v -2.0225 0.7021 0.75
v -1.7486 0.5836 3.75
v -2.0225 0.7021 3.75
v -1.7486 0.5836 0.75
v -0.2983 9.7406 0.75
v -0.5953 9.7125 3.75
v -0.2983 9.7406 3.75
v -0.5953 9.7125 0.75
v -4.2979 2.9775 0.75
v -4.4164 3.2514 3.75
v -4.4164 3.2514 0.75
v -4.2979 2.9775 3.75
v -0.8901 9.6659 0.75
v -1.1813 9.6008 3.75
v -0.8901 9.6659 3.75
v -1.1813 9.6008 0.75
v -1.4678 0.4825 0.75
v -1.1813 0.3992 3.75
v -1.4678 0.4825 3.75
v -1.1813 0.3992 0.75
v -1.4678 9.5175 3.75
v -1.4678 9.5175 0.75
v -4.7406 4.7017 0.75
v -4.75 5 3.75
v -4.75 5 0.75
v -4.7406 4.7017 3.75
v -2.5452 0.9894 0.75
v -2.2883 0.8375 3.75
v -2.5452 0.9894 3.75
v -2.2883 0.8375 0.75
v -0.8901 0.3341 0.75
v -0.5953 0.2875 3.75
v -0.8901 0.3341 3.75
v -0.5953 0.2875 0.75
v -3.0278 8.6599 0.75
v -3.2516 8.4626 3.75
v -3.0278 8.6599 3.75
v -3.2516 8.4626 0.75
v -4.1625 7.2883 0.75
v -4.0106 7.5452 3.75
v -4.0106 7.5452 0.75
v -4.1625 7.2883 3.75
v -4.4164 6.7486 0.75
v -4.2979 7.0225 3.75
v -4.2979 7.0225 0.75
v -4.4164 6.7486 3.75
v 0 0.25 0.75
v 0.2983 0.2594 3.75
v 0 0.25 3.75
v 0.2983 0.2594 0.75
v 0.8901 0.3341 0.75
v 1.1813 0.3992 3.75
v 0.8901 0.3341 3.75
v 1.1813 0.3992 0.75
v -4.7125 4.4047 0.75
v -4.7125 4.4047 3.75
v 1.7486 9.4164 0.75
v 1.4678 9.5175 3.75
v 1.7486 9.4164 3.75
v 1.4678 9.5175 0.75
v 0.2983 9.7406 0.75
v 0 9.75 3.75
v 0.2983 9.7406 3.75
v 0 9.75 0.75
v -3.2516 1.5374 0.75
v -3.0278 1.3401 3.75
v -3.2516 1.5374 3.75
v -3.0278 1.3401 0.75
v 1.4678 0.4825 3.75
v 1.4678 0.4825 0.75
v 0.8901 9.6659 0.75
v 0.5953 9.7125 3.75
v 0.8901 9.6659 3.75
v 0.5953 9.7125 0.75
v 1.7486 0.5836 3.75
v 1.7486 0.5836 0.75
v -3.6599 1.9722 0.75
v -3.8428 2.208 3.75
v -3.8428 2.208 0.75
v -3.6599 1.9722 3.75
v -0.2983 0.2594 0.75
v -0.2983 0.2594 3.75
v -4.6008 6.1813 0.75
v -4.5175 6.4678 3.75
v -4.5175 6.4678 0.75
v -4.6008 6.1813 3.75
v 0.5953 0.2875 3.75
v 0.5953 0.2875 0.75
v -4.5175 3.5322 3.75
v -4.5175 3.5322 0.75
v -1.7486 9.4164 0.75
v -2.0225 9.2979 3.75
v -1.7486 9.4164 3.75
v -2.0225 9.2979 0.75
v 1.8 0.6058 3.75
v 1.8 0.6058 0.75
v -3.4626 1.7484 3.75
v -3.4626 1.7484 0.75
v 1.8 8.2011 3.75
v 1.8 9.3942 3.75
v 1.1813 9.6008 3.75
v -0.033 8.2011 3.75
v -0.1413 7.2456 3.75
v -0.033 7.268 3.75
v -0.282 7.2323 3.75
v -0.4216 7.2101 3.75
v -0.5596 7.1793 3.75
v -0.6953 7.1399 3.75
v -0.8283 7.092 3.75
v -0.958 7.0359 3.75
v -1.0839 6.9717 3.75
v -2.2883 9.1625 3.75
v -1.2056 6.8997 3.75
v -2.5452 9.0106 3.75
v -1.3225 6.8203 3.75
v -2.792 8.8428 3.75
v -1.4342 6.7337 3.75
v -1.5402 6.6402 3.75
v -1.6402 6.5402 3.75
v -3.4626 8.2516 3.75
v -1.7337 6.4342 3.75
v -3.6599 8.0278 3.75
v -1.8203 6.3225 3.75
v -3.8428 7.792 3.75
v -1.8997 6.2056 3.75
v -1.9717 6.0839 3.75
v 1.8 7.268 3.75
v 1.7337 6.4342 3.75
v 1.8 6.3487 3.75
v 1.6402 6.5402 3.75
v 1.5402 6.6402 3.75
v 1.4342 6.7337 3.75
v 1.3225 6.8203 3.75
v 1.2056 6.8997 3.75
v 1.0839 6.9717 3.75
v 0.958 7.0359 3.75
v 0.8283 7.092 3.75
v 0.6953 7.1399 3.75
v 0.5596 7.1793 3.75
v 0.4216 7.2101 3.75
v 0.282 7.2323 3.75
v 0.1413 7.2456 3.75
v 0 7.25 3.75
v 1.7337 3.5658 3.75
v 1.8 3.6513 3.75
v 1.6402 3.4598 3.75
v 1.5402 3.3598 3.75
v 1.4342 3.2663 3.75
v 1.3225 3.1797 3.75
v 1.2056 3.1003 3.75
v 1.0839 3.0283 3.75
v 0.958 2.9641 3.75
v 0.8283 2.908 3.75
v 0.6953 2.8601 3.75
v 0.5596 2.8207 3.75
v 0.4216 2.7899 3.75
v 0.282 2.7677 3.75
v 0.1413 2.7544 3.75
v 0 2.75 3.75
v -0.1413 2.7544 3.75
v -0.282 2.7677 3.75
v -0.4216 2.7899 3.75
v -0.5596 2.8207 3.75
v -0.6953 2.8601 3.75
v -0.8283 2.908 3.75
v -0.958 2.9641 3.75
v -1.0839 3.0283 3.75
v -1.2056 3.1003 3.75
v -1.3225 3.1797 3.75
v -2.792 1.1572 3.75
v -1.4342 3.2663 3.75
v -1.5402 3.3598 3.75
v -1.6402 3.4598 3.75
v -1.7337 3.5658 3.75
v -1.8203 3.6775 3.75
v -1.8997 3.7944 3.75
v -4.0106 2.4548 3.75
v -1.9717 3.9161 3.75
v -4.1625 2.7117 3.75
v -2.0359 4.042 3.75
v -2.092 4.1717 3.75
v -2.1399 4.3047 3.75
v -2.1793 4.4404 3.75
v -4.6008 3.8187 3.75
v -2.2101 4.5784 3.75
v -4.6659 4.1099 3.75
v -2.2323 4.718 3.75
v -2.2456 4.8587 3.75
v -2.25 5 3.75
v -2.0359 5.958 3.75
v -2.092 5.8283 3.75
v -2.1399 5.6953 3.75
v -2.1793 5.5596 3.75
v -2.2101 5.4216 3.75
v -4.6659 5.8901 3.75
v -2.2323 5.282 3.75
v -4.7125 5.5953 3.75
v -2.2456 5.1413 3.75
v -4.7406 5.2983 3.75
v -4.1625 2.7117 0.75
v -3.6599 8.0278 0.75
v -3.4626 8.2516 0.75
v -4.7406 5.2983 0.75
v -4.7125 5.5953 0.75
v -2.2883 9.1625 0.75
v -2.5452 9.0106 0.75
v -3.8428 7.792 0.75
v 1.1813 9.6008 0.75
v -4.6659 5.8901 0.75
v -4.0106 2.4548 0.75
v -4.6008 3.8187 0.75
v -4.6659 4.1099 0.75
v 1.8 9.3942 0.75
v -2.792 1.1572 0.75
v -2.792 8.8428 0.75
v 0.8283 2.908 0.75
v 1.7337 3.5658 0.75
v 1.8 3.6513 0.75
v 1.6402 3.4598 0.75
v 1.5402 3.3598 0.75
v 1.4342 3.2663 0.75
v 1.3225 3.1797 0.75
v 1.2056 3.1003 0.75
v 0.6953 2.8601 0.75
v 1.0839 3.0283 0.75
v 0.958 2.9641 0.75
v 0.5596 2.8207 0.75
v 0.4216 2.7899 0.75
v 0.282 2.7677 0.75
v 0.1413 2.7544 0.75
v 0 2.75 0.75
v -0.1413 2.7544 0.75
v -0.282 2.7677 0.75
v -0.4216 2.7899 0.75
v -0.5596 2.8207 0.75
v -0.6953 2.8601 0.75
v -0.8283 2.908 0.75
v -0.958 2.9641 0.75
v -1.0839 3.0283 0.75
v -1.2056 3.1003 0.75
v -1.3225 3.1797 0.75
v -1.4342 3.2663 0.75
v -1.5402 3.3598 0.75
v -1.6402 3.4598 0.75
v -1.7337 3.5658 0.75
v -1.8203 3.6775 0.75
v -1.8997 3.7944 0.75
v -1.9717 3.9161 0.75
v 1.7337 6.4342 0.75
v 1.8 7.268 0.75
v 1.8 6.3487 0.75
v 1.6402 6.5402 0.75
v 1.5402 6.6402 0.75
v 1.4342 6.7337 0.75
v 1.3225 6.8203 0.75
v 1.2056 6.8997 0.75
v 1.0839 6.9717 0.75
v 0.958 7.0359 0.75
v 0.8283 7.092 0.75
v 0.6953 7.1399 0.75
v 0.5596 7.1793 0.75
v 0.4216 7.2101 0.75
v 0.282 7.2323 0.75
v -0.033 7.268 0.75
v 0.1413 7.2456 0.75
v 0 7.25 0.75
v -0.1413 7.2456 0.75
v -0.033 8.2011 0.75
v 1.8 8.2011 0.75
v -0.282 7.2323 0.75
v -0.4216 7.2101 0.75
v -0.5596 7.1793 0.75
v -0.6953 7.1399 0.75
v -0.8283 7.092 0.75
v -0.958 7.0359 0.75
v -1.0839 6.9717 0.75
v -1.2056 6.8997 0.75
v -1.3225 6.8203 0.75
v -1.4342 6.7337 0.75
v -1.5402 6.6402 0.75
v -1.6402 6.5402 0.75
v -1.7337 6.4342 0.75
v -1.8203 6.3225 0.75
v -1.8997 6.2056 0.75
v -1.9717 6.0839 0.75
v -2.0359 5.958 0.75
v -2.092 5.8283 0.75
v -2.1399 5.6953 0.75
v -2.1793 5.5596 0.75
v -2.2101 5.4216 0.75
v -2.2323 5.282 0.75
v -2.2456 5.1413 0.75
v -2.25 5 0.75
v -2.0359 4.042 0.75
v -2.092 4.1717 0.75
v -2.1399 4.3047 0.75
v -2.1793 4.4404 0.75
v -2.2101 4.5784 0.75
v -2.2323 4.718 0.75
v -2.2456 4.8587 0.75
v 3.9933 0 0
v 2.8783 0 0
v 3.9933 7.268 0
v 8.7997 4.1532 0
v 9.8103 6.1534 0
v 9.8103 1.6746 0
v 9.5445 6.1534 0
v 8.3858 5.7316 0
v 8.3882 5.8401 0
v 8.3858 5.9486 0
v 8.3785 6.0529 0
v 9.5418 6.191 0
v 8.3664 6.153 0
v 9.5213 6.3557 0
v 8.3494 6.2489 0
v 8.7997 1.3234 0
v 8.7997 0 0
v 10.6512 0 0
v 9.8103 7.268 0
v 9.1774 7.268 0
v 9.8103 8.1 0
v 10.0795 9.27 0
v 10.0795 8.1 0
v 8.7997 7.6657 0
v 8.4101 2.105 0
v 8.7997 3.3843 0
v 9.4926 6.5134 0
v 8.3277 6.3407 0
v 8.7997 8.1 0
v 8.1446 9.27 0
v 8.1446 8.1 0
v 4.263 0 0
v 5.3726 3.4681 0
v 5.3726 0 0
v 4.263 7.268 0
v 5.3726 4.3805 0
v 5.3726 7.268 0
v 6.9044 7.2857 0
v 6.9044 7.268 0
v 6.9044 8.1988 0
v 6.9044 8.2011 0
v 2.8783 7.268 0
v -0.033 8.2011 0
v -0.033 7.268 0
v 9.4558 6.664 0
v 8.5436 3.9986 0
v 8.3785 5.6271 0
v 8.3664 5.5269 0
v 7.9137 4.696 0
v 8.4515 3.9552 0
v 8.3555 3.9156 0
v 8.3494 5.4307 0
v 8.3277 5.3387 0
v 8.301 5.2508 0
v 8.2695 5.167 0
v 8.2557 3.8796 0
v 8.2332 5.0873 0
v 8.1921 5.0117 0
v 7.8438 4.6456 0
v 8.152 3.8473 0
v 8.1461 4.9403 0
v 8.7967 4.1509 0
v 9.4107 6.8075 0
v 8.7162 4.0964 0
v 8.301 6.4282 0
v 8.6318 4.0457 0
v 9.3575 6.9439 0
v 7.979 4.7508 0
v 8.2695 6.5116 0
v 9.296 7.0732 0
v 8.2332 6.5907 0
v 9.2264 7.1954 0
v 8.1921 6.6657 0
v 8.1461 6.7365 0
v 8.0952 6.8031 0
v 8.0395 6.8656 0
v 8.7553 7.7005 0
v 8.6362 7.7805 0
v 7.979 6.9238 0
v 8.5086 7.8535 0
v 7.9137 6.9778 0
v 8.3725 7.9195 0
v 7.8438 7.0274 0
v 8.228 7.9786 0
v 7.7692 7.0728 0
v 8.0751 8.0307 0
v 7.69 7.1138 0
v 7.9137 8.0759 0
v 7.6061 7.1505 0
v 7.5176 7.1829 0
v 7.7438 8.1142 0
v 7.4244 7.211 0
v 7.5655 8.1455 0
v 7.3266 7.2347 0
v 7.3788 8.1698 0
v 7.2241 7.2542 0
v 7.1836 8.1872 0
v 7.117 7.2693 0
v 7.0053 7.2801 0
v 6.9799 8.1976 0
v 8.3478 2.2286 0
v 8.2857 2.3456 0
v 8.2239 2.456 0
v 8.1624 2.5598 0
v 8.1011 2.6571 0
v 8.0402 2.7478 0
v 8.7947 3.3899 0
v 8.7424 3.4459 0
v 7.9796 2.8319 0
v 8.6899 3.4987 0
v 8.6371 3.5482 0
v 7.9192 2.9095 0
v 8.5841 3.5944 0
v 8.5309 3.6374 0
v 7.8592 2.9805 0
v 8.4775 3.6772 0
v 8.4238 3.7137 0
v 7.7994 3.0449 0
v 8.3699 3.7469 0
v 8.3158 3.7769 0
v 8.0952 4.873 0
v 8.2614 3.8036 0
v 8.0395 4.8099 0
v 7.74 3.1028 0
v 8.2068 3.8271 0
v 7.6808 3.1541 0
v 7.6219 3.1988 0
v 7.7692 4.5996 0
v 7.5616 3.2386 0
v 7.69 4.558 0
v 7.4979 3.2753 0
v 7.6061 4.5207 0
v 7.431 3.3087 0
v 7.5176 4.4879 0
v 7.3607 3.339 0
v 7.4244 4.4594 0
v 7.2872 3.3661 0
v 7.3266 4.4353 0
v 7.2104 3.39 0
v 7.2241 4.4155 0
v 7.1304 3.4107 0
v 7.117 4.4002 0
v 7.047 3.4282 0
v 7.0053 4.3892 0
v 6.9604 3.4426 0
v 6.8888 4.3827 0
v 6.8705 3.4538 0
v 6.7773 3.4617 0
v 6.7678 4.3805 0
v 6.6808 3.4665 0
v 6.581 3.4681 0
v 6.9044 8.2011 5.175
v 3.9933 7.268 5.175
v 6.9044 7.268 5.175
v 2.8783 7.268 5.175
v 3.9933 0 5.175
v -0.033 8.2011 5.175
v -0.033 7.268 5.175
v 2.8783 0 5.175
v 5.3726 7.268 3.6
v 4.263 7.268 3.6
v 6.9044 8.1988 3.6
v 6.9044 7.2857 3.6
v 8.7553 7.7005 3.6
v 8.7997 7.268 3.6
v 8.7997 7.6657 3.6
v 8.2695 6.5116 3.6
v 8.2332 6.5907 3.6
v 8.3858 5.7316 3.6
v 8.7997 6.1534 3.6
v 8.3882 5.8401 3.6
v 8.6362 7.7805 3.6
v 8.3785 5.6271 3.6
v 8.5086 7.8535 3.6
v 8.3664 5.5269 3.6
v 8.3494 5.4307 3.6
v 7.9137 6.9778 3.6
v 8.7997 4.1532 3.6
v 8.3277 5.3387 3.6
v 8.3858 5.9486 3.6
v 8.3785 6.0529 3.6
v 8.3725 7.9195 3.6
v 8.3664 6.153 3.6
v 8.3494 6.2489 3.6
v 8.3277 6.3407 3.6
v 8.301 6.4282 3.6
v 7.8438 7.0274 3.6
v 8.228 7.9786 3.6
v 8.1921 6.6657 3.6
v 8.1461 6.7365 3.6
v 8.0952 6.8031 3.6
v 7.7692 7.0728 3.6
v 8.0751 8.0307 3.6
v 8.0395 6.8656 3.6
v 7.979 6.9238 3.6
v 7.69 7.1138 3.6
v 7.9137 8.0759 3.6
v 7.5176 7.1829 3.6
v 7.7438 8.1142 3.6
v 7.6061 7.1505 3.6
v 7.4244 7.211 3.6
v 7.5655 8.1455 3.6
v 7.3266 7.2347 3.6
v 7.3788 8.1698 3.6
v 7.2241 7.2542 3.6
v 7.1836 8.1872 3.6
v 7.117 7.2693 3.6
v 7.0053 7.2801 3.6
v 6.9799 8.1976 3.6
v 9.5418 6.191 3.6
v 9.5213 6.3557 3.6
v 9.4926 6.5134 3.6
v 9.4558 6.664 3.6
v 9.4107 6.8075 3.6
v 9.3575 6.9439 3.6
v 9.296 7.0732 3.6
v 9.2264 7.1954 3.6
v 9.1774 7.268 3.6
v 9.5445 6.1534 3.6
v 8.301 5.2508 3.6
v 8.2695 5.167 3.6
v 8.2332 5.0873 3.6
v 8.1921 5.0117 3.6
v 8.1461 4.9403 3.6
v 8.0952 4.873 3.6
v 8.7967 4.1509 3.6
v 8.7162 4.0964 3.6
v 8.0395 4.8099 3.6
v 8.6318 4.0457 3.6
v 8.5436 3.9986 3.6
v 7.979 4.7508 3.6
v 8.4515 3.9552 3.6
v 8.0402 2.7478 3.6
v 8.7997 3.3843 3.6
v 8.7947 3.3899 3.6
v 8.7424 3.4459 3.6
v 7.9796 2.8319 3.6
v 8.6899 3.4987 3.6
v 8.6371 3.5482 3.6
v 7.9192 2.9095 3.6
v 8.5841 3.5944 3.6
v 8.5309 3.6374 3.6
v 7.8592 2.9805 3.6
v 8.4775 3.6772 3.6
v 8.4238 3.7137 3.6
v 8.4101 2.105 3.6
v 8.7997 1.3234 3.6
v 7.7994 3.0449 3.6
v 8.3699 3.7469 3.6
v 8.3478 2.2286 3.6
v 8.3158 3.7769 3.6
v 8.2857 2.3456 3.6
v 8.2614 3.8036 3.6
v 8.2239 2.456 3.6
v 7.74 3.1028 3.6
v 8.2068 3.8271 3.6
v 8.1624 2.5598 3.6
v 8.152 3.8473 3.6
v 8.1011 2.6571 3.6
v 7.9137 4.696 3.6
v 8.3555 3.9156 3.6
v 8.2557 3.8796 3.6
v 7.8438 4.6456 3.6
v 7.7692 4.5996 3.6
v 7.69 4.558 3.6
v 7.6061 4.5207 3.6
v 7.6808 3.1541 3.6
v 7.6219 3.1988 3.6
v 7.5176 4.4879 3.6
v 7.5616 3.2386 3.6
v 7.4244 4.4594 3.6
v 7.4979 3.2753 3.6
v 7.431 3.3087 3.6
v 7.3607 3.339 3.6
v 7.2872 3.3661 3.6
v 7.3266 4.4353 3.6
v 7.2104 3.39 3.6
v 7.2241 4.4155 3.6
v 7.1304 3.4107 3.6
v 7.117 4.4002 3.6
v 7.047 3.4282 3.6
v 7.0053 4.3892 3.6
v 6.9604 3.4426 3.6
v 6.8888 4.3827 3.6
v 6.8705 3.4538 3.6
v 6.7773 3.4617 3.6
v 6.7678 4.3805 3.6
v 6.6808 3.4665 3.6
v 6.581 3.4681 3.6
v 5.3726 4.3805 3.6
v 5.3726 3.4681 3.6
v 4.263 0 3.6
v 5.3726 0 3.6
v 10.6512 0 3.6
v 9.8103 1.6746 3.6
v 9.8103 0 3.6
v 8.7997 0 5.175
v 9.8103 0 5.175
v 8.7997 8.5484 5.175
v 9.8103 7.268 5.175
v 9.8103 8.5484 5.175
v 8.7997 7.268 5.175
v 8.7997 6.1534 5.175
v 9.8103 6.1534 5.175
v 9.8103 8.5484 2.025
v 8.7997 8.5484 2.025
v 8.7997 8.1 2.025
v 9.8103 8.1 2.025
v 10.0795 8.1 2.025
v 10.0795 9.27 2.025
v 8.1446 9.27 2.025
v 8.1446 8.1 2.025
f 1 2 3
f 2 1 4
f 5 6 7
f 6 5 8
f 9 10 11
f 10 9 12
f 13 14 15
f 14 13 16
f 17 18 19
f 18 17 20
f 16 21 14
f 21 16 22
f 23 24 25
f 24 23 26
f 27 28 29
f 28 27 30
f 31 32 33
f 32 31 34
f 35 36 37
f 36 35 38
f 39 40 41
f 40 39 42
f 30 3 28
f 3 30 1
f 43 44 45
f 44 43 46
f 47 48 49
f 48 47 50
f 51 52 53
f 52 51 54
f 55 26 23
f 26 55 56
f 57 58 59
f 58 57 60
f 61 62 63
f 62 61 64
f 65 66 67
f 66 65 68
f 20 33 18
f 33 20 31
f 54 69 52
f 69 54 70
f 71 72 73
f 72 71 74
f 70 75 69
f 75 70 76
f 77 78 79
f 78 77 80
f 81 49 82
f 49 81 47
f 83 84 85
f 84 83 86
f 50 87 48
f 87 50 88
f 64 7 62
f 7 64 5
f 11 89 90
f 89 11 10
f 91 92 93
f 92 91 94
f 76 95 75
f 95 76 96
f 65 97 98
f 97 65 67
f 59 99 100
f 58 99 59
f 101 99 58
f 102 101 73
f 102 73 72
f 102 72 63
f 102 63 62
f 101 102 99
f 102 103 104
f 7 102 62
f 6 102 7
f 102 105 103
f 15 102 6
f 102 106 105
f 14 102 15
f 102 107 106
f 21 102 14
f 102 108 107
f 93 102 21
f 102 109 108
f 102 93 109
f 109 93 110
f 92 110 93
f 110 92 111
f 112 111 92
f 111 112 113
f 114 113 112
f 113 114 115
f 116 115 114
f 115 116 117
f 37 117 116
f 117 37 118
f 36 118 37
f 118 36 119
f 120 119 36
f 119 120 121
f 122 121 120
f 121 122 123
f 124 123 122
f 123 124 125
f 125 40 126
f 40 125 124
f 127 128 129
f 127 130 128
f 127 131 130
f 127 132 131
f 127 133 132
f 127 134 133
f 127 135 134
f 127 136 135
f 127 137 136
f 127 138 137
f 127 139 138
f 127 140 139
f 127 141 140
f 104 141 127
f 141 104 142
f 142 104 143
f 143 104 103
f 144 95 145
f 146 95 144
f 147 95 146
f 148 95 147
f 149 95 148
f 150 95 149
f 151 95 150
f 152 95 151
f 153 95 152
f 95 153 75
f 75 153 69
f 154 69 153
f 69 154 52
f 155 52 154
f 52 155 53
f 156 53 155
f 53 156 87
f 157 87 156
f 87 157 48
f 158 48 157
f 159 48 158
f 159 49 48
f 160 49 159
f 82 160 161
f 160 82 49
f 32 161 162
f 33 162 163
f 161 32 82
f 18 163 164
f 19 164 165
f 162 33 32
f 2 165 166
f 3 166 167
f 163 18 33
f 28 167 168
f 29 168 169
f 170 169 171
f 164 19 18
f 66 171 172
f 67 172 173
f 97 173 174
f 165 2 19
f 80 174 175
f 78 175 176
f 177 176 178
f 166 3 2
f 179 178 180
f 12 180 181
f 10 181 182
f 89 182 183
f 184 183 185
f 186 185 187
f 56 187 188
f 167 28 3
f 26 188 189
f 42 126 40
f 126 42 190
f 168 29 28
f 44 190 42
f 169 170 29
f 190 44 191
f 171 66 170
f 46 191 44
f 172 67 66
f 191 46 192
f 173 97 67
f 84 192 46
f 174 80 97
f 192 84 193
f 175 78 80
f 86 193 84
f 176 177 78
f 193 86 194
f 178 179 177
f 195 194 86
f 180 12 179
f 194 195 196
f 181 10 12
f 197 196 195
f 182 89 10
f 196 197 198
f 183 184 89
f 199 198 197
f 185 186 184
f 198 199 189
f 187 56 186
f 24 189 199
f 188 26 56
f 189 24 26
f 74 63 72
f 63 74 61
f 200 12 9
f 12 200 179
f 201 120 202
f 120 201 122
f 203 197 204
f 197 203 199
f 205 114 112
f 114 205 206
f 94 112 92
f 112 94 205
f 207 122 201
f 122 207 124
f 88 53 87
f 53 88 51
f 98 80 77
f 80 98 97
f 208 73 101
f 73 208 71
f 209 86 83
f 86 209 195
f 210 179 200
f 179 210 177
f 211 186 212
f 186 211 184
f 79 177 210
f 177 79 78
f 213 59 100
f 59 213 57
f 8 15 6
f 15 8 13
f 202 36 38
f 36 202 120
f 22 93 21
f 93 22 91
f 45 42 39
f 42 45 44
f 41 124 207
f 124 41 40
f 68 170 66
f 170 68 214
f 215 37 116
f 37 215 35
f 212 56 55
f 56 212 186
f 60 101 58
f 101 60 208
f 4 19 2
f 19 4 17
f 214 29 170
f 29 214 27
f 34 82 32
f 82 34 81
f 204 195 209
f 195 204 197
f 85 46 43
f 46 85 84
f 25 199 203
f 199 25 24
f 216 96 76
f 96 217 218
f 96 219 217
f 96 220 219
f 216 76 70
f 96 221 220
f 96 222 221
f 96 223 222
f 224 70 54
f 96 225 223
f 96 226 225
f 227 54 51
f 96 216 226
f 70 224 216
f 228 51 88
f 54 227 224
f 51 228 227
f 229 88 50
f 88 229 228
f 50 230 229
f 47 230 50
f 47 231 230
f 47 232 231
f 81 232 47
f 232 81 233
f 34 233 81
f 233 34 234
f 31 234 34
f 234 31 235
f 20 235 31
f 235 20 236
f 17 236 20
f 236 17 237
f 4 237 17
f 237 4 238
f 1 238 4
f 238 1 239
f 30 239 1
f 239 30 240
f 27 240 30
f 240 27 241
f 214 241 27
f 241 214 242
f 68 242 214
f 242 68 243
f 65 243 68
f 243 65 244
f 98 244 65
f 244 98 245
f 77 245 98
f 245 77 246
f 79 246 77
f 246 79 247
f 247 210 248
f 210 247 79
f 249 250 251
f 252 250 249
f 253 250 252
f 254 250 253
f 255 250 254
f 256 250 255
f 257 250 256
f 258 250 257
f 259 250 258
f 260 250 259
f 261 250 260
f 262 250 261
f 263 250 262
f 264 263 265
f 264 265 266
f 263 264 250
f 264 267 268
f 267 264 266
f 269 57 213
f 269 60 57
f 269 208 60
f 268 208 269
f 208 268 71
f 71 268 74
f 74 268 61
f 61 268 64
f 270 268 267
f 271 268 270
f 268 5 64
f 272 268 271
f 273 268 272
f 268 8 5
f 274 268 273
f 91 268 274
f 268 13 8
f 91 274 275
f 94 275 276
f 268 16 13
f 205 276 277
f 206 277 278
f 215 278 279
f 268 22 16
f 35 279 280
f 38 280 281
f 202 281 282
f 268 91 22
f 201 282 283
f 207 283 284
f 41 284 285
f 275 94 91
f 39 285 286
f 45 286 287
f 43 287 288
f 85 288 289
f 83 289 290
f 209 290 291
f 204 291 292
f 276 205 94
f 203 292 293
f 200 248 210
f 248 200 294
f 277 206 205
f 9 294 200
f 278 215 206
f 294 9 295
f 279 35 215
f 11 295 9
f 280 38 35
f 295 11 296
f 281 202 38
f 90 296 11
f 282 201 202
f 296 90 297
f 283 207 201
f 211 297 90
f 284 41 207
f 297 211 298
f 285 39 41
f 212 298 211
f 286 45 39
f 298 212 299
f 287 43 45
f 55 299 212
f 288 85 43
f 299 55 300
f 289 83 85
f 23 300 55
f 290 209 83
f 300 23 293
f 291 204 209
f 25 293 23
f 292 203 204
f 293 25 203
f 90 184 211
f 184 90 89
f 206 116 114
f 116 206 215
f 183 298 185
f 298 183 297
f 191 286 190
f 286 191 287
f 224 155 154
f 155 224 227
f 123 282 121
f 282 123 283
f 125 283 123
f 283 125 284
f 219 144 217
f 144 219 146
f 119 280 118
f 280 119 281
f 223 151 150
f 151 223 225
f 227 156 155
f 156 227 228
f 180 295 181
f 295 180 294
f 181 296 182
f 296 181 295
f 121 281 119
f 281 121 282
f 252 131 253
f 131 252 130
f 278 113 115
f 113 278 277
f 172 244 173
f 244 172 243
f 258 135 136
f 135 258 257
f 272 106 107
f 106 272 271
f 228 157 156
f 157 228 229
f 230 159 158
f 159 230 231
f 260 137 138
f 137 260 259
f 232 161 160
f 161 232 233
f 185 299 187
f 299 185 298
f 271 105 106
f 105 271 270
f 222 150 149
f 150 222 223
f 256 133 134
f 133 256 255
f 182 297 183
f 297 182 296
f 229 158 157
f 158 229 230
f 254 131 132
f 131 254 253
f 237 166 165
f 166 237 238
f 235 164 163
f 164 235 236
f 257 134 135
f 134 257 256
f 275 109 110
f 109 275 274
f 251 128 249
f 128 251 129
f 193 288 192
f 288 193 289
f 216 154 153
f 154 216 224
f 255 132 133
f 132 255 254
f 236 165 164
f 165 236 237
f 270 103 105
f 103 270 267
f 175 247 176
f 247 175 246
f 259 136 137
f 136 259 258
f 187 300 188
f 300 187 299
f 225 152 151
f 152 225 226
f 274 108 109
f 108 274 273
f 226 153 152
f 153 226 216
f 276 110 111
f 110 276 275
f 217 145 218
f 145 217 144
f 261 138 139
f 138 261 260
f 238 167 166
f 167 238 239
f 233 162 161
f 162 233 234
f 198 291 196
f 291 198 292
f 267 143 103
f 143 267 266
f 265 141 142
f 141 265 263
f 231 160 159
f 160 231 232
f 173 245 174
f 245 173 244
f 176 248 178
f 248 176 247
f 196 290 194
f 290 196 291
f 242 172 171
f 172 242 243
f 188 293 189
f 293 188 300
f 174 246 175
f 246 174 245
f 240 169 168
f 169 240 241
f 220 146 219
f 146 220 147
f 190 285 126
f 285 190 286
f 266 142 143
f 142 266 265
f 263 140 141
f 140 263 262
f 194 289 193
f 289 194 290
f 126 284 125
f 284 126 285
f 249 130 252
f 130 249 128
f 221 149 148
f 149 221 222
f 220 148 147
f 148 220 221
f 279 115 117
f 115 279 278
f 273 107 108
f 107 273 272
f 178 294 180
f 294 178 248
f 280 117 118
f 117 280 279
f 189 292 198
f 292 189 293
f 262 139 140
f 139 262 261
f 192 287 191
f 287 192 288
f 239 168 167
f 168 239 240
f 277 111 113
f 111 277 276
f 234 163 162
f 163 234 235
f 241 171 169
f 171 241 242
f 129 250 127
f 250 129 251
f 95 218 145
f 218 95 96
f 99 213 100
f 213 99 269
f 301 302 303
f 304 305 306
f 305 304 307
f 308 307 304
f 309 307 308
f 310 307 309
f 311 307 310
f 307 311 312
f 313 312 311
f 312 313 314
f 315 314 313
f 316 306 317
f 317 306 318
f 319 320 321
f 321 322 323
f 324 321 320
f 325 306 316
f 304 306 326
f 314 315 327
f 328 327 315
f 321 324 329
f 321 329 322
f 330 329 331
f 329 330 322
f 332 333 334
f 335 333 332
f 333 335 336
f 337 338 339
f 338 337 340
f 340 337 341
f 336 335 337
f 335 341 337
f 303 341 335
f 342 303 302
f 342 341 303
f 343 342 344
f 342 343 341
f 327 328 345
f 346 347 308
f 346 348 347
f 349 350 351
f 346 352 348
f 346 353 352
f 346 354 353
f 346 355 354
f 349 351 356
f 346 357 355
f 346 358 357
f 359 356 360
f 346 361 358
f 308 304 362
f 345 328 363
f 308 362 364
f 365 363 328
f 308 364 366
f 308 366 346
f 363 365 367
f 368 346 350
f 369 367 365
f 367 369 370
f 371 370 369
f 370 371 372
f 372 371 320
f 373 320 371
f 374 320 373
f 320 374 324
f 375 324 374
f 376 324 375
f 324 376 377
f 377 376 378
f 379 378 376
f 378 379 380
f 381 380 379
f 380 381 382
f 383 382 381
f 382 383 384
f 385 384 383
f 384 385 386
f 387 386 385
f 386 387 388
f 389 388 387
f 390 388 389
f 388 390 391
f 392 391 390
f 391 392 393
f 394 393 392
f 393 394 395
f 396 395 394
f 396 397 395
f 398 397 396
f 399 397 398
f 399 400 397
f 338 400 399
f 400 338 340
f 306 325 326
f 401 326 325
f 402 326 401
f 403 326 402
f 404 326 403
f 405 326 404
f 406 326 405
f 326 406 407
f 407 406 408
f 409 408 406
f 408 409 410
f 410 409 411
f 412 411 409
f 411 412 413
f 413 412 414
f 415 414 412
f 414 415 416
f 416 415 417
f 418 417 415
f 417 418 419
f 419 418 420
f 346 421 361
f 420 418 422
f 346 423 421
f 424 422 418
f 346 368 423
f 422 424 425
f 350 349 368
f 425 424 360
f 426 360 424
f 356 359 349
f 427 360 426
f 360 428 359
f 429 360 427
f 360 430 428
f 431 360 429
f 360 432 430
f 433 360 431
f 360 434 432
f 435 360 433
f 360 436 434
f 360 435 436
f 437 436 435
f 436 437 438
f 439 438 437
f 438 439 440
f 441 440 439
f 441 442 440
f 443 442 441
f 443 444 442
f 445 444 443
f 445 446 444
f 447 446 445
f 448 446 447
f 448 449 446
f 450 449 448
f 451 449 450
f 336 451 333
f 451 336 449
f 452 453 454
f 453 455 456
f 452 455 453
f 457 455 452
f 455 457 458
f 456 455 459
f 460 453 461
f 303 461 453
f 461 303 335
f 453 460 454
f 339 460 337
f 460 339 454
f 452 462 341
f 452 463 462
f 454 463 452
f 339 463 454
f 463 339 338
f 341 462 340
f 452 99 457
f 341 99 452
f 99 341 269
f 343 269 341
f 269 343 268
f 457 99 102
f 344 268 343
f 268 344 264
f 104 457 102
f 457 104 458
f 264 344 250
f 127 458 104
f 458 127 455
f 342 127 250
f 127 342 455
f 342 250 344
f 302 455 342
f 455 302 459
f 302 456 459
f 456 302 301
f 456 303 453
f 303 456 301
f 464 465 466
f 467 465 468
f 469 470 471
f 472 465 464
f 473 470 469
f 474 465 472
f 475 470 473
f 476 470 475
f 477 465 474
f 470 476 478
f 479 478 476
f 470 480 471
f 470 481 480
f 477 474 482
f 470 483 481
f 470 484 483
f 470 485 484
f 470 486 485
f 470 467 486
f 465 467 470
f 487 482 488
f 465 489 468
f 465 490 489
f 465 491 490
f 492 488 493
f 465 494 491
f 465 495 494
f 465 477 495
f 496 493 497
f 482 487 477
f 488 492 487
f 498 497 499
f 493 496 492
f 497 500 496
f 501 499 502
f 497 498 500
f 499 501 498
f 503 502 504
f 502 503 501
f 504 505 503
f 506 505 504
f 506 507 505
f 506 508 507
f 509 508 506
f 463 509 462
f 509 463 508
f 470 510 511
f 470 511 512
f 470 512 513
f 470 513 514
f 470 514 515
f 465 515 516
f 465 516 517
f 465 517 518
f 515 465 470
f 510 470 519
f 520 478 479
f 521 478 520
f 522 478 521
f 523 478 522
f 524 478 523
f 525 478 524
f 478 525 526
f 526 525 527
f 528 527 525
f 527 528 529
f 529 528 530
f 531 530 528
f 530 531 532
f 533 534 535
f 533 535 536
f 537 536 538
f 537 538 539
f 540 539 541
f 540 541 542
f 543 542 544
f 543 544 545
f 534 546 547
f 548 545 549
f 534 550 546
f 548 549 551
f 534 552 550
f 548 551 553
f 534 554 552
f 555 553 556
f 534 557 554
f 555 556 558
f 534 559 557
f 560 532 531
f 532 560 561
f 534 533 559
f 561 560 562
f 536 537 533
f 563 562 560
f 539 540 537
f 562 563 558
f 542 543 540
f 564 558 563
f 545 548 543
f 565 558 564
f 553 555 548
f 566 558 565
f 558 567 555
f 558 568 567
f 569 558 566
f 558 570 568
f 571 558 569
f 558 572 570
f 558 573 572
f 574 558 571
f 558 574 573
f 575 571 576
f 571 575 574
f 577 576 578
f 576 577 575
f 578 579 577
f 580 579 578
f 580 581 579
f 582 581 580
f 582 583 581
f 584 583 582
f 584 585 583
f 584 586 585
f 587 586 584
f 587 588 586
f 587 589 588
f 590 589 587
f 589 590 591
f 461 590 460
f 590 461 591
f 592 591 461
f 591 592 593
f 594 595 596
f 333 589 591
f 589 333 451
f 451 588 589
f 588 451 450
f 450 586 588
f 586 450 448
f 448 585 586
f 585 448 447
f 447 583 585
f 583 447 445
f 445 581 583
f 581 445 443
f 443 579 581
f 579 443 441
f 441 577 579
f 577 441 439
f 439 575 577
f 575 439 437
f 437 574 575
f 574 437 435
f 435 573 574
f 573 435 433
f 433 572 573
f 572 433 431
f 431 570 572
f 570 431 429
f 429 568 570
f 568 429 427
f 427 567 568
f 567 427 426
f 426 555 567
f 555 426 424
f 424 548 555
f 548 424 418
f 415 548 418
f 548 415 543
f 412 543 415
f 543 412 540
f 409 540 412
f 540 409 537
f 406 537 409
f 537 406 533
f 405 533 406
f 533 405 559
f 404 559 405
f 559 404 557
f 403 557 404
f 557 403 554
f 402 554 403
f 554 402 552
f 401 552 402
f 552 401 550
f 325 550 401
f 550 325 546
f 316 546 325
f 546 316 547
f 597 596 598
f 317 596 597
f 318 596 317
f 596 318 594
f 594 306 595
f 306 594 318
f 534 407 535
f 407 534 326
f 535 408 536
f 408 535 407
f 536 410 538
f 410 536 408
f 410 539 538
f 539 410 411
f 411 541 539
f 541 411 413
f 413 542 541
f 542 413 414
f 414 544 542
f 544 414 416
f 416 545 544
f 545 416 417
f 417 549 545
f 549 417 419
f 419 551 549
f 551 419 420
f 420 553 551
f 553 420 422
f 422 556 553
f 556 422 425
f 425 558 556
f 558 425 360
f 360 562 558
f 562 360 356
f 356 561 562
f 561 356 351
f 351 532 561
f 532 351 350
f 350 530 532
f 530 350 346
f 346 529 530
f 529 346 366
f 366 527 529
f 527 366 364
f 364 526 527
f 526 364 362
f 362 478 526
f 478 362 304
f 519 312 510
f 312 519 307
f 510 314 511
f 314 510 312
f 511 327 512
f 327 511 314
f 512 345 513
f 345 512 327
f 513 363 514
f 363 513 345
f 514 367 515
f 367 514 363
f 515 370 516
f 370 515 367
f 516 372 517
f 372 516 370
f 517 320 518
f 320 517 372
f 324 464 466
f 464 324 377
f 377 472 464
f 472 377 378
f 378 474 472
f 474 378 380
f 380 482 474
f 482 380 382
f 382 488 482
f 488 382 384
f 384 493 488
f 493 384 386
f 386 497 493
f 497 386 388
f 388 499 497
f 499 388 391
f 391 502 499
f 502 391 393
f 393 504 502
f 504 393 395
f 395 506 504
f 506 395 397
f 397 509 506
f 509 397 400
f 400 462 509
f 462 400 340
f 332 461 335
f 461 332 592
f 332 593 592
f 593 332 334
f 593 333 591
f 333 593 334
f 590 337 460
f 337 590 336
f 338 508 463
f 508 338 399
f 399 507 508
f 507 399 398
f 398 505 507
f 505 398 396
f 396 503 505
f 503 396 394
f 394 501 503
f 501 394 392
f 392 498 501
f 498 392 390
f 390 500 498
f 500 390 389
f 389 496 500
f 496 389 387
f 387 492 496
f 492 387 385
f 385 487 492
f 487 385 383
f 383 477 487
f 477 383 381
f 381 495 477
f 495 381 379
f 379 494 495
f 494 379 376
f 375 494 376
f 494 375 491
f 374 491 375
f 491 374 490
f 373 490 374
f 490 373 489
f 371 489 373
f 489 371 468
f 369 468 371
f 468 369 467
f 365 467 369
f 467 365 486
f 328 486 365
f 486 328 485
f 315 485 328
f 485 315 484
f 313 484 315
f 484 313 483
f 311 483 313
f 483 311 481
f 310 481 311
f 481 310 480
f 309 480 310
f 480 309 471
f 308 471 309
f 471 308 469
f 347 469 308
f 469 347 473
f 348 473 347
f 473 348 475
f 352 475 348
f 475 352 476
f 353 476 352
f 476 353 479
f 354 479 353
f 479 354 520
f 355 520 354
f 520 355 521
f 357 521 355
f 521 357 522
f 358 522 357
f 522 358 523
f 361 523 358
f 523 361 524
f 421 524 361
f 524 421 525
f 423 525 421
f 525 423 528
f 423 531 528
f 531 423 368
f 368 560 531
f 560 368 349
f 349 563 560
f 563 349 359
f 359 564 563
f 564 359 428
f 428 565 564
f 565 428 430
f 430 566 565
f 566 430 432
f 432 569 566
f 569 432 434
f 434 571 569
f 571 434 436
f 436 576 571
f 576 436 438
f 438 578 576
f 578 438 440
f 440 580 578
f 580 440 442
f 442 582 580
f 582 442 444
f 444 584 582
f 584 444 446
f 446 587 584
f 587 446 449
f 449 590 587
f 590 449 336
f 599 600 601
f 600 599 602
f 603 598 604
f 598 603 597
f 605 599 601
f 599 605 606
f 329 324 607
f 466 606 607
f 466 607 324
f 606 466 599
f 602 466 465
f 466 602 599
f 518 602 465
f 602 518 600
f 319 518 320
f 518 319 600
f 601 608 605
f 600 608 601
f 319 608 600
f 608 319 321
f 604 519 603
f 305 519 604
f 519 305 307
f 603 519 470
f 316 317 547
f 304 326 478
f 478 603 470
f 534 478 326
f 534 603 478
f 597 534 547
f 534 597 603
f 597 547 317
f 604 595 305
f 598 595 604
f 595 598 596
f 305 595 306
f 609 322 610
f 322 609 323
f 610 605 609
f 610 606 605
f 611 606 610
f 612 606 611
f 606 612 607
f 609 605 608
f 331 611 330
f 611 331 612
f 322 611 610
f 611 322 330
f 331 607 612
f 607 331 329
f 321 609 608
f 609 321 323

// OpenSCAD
/* [Text] */
// Text
text = "TRi";

/* [General Settings] */
// Font
font = "Anton"; // [Archivo Black, Bangers, Bungee, Changa One, Bebas Neue, Poppins Black]

// Font size
font_size = 18; // [5:1:50]

// Global spacing multiplier
spacing = 0.65; // [0.1:0.05:2]

// Use automatic spacing based on character width
use_auto_spacing = true; // [true,false]

/* [Colors] */
// Use single color
use_single_color = true; // [true,false]


keychainHoleSize = 4.5; // Diameter of the keychain hole
keychainHoleOffset = -2;// Offset of the keychain hole from the left
// Radius of edge, Increase to fill in gaps
r = 2;

// Box customization parameters
boxWidth = 0;      // Width of the box
boxHeight = 0;     // Height of the box
boxXOffset = 0;     // Horizontal offset for the box
boxYOffset = -30;   // Vertical offset for the box
// Color array definition
$fn = 100;
thickness = 4;
available_colors = [
    ["Red", [1, 0, 0]],
    ["Dark Red", [0.5, 0, 0]],
    ["Green", [0, 1, 0]],
    ["Dark Green", [0, 0.5, 0]],
    ["Blue", [0, 0, 1]],
    ["Dark Blue", [0, 0, 0.5]],
    ["Yellow", [1, 1, 0]],
    ["Orange", [1, 0.5, 0]],
    ["Purple", [0.5, 0, 0.5]],
    ["Pink", [1, 0.4, 0.7]],
    ["White", [1, 1, 1]],
    ["Black", [0, 0, 0]],
    ["Light Gray", [0.8, 0.8, 0.8]],
    ["Dark Gray", [0.3, 0.3, 0.3]],
    ["Turquoise", [0, 0.8, 0.8]]
];

// General color
general_color = "Green";

// Ring color
ring_color = "Green";

/* [Individual Adjustments] */
position_1  = 0;
position_2  = 0;
position_3  = 0;
position_4  = 0;
position_5  = 0;
position_6  = 0;
position_7  = 0;
position_8  = 0;
position_9  = 0;
position_10 = 0;
position_11 = 0;
position_12 = 0;

/* [Heights] */
// Height for odd letters
odd_height = 11.5; // [1:0.5:10]

// Height for even letters
even_height = 8; // [1:0.5:10]

/* [Ring] */
show_ring = true;
ring_x = -4.0;
ring_y = 0.5;
ring_height = 3;
ring_size = 8;

/* [Lowercase i Connector] */
enable_i_connector = true; // [true,false]
i_connector_width  = 4.3;  // [0.4:0.1:2]
i_connector_depth  = 2.6;  // [0.4:0.1:2]

/* ========================================================= */
/* ===================== FUNCTIONS ========================= */
/* ========================================================= */

function get_color_rgb(color_name) =
    let(c = [for(x = available_colors) if (x[0] == color_name) x[1]])
    len(c) > 0 ? c[0] : [1,1,1];

function get_height(pos) =
    (pos % 2 == 0) ? odd_height : even_height;

function get_adjustment(pos) =
    pos == 0  ? position_1  :
    pos == 1  ? position_2  :
    pos == 2  ? position_3  :
    pos == 3  ? position_4  :
    pos == 4  ? position_5  :
    pos == 5  ? position_6  :
    pos == 6  ? position_7  :
    pos == 7  ? position_8  :
    pos == 8  ? position_9  :
    pos == 9  ? position_10 :
    pos == 10 ? position_11 :
    pos == 11 ? position_12 : 0;
    
function get_cumulative_adjustment(pos) =
    pos < 0 ? 0 :
    get_cumulative_adjustment(pos - 1) + get_adjustment(pos);
// Character width heuristic
function in_string(c, s) = len(search(c, s)) > 0;

function get_letter_width(c) =
    in_string(c, 
    "I" ) ? 0.3
    : in_string(c, 
    "ilI!j|[]'.," ) ? 0.36
    : in_string(c, 
    "ft") ? 0.45
    : in_string(c, 
    "r1") ? 0.52
    : in_string(c,
    "0123456789TFE") ? 0.6
    : in_string(c,
    "zZLy") ? 0.7
    : in_string(c,
    "vxSJY") ? 0.8
    : in_string(c, 
    "w") ? 1.15
    : in_string(c, 
    "WmM@#") ? 1.35
    : in_string(c, 
    "@") ? 1.5
    : 0.87;

function get_auto_spacing(pos) =
    pos < 0 ? 0 :
    get_auto_spacing(pos - 1)
    + (font_size * spacing * get_letter_width(text[pos]));

function is_lowercase_i(c) = c == "i" || c == "j";

kerning_pairs = [
    ["AV", -0.1],
    ["VA", -0.12],
    ["AW", -0.1],
    ["WA", -0.1],
    ["AT", -0.06],
    ["TA", -0.05],
    ["AY", -0.1],
    ["YA", -0.1],
    ["PA", -0.09],
    ["TT", 0.1],
    
    ["wa", 0.1],
    ["ya", -0.06],
    ["tt", 0.1],
    ["wt", 0.1],
    ["wt", 0.1],
    ["wv", 0.06],
    ["yw", -0.06],
    ["yv", -0.06],
    ["aw", -0.06],
    ["ij", -0.05],
    ["Ij", -0.05],
    ["je", -0.1],
    ["ji", -0.15],
    ["aT", -0.05],
    ["Ta", -0.05],
    ["At", -0.05],
    ["tA", -0.05],
    ["at", -0.05],
    ["ta", -0.05],
    ["ox", -0.05],
    ["xo", -0.05],
    ["Tv", -0.05],
    ["vT", -0.05],
    ["rJ", -0.13],
    ["Yx", -0.1],
    ["xY", -0.1],
    ["Yr", -0.1],
    ["YJ", -0.2],
    ["Yy", -0.1],
    ["Tx", -0.05],
    ["xT", -0.05],
    ["Rj", -0.05],
    ["Xy", -0.08],
    ["Yj", -0.08],
    ["vJ", -0.08],
    ["VJ", -0.08],
    ["Vj", -0.08],
    ["vj", -0.08],
    ["WJ", -0.08],
    ["wJ", -0.08],
    ["YC", -0.05],
    ["CY", -0.05],
    ["YG", -0.05],
    ["GY", -0.05],
    ["LY", -0.25],
    ["OY", -0.05],
    ["YO", -0.05],
    ["QY", -0.05],
    ["YQ", -0.05],
    ["PY", -0.05],
    ["aY", -0.1],
    ["Ya", -0.1],
    ["Yb", -0.1],
    ["cY", -0.1],
    ["Yc", -0.1],
    ["dY", -0.1],
    ["eY", -0.1],
    ["Ye", -0.1],
    ["fY", -0.08],
    ["Yg", -0.1],
    ["Ym", -0.1],
    ["nY", -0.1],
    ["Yn", -0.1],
    ["oY", -0.1],
    ["Yo", -0.1],
    ["pY", -0.1],
    ["Yp", -0.1],
    ["qY", -0.1],
    ["Yq", -0.1],
    ["sY", -0.1],
    ["Ys", -0.1],
    ["uY", -0.08],
    ["Yu", -0.08],
    ["vY", -0.08],
    ["Yv", -0.08],
    ["Yw", -0.08],
    ["Yz", -0.08],
    ["ra", -0.03],
    ["re", -0.03],
    ["rs", -0.03],
    ["rq", -0.03],
    ["Le", -0.12],
    ["Lo", -0.12],
    ["Lq", -0.12],
    ["La", -0.12],
    ["Ld", -0.12],
];

// Adjustment untuk satu posisi (non kumulatif)
function get_pair_adjustment_single(pos, i=0) =
    pos <= 0 ? 0 :
    let(pair = str(text[pos-1], text[pos]))
    (
        i >= len(kerning_pairs) ? 0 :
        pair == kerning_pairs[i][0]
            ? font_size * spacing * kerning_pairs[i][1]
            : get_pair_adjustment_single(pos, i+1)
    );

// Kerning kumulatif sampai posisi sekarang
function get_pair_adjustment(pos) =
    pos < 0 ? 0 :
    get_pair_adjustment(pos - 1)
    + get_pair_adjustment_single(pos);

function get_first_letter_offset() =
in_string(text[0], 
    "TY" ) ? -3 : 
in_string(text[0], 
    "vVy" ) ? -1 : 0;
/* ========================================================= */
/* ===================== RENDER ============================ */
/* ========================================================= */

// Ring
// Ring 2/3 (clipped on right side)
if (show_ring) {

    ring_x_pos = -keychainHoleOffset - 2;
    ring_y_pos = 5;

    difference() {

        // Donut
        difference() {
            translate([ring_x_pos, ring_y_pos, 0.75])
                cylinder(h = ring_height, d = keychainHoleSize + 5);

            translate([ring_x_pos, ring_y_pos,  0.75])
                cylinder(h = ring_height + 0.75, d = keychainHoleSize);
        }

        // Cut right side (biar jadi 2/3)
        translate([ring_x_pos +1.8, ring_y_pos - 20, -2])
            cube([20, 40, ring_height + 4]);
    }
}

// Letters
scale([0.45, 0.45, 0.45]) 
for (i = [0 : len(text) - 1]) {

    pos_x =
    (use_auto_spacing
        ? get_auto_spacing(i - 1)
        : i * font_size * spacing)
    + get_cumulative_adjustment(i)
    + get_pair_adjustment(i);

    // Main letter
    color(get_color_rgb(general_color))
    translate([pos_x, 0, 0])
    linear_extrude(height = get_height(i))
    text(
        text[i],
        font = font,
        size = font_size,
        kerning = true
    );

    // Connector for lowercase "i"
    if (enable_i_connector && is_lowercase_i(text[i])) {

        translate([
            pos_x + font_size * (text[i] == "i" ? 0.05 : 0.075),
            18,
            0
        ])
        color(get_color_rgb(general_color))
        cube([
            i_connector_width,
            i_connector_depth,
            font_size * 0.25   // intentionally tall to reach dot
        ]);
    }
}
